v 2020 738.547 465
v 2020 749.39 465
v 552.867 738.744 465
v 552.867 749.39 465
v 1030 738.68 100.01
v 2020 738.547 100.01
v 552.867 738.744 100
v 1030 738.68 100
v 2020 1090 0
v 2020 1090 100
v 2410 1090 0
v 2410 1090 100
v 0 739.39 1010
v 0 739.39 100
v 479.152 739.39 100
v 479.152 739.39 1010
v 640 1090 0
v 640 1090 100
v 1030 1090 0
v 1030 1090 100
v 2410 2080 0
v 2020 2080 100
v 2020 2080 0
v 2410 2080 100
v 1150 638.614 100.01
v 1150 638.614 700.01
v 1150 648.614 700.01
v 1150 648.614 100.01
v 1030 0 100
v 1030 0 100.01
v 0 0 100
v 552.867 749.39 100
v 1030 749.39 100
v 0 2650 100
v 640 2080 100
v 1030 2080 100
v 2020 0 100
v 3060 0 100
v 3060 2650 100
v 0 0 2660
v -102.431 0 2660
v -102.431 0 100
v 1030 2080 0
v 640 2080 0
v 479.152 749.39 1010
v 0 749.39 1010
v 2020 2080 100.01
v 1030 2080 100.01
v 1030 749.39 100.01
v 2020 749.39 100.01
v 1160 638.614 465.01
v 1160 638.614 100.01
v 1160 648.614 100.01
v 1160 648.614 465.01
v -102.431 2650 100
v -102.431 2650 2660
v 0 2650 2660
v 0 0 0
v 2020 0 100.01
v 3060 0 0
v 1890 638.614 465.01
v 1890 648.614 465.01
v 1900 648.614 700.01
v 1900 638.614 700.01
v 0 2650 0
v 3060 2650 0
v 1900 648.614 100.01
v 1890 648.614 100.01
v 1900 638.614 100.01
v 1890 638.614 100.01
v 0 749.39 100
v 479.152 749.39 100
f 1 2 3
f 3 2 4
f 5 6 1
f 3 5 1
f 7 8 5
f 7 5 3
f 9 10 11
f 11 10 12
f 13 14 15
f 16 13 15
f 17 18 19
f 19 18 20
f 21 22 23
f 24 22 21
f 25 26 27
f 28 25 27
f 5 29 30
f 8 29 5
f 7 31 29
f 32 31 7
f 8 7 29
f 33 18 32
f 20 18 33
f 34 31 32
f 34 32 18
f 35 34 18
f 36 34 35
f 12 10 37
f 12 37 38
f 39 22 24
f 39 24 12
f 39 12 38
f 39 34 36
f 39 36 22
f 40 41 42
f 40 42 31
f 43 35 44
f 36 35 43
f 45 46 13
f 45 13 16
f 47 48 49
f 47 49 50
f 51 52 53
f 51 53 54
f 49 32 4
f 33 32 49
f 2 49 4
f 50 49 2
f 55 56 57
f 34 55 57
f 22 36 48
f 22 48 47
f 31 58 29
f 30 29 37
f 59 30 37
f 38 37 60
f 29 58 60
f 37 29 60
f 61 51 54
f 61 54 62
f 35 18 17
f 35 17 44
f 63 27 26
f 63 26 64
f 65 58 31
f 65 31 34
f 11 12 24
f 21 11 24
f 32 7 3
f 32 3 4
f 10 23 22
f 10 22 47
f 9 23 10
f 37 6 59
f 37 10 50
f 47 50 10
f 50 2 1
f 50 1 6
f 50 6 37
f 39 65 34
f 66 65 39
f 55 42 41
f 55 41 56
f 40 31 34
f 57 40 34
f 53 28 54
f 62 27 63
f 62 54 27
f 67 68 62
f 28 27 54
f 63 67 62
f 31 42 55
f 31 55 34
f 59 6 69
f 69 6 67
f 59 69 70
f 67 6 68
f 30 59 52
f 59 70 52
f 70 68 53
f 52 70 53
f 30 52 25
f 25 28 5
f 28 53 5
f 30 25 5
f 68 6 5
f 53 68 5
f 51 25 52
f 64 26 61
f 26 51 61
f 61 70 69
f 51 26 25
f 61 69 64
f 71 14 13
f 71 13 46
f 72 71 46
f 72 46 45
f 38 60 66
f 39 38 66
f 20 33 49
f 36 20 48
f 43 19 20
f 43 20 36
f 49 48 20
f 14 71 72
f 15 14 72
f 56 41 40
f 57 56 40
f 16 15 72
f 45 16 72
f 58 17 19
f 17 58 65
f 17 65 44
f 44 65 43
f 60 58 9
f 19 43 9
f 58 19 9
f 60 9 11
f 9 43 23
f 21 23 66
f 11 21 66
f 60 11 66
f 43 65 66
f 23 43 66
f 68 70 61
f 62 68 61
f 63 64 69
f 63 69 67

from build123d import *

# Parameters (mm, degrees)
ESBO_O6_W                = 3060
ESBO_O6_H                = 2650
RESSALTO_EXTRUS_O2_DEPTH = 100
ESBO_O7_W                = 390
ESBO_O7_H                = 990
CORTE_EXTRUS_O1_DEPTH    = 749
ESBO_O8_W                = 102.431246956
ESBO_O8_H                = 2650
RESSALTO_EXTRUS_O3_DEPTH = 2560
ESBO_O9_W                = 479.151961804
ESBO_O9_H                = 10
RESSALTO_EXTRUS_O5_DEPTH = 910
RESSALTO_EXTRUS_O7_DEPTH = 365
ESBO_O13_W               = 990
ESBO_O13_H               = 1330.610148593
RESSALTO_EXTRUS_O8_DEPTH = 0.01
ESBO_O14_W               = 750
ESBO_O14_H               = 10
RESSALTO_EXTRUS_O9_DEPTH = 600
ESBO_O16_W               = 730
ESBO_O16_H               = 365
CORTE_EXTRUS_O2_DEPTH    = 45


with BuildPart() as part:
    # Esboço6 → Ressalto-extrusão2 (new body)
    with BuildSketch(Plane.XY):
        with Locations((1530, 1325)):
            Rectangle(ESBO_O6_W, ESBO_O6_H)
    extrude(amount=RESSALTO_EXTRUS_O2_DEPTH)

    # Esboço7 → Corte-extrusão1 (cut)
    with BuildSketch(Plane.XY.offset(100)):
        with Locations((2215, 1585)):
            Rectangle(ESBO_O7_W, ESBO_O7_H)
        with Locations((835, 1585)):
            Rectangle(ESBO_O7_W, ESBO_O7_H)
    extrude(amount=-CORTE_EXTRUS_O1_DEPTH, mode=Mode.SUBTRACT)

    # Esboço12 → Ressalto-extrusão7 (add)
    with BuildSketch(Plane.XY.offset(100)):
        Polygon((552.866885131, 749.389851407), (2020, 749.389851407), (2020, 738.547480568), (552.866885131, 738.743736065), align=None)
    extrude(amount=RESSALTO_EXTRUS_O7_DEPTH)

    # Esboço13 → Ressalto-extrusão8 (add)
    with BuildSketch(Plane.XY.offset(100)):
        with Locations((1525, 1414.694925704)):
            Rectangle(ESBO_O13_W, ESBO_O13_H)
        Polygon((2020, 738.547480568), (2020, 0), (1030, 0), (1030, 738.679910911), align=None)
    extrude(amount=RESSALTO_EXTRUS_O8_DEPTH)

    # Esboço14 → Ressalto-extrusão9 (add)
    with BuildSketch(Plane.XY.offset(100.01)):
        with Locations((1525, 643.61369574)):
            Rectangle(ESBO_O14_W, ESBO_O14_H)
    extrude(amount=RESSALTO_EXTRUS_O9_DEPTH)

    # Esboço16 → Corte-extrusão2 (cut)
    with BuildSketch(Plane.XZ.offset(-638.61369574)):
        with Locations((1525, 282.51)):
            Rectangle(ESBO_O16_W, ESBO_O16_H)
    extrude(amount=-CORTE_EXTRUS_O2_DEPTH, mode=Mode.SUBTRACT)


with BuildPart() as body_2:
    # Esboço8 → Ressalto-extrusão3 (new body)
    with BuildSketch(Plane.XY.offset(100)):
        with Locations((-51.215623478, 1325)):
            Rectangle(ESBO_O8_W, ESBO_O8_H)
    extrude(amount=RESSALTO_EXTRUS_O3_DEPTH)


with BuildPart() as body_3:
    # Esboço9 → Ressalto-extrusão5 (new body)
    with BuildSketch(Plane.XY.offset(100)):
        with Locations((239.575980902, 744.389851407)):
            Rectangle(ESBO_O9_W, ESBO_O9_H)
    extrude(amount=RESSALTO_EXTRUS_O5_DEPTH)


solid = Compound([part.part, body_2.part, body_3.part])
